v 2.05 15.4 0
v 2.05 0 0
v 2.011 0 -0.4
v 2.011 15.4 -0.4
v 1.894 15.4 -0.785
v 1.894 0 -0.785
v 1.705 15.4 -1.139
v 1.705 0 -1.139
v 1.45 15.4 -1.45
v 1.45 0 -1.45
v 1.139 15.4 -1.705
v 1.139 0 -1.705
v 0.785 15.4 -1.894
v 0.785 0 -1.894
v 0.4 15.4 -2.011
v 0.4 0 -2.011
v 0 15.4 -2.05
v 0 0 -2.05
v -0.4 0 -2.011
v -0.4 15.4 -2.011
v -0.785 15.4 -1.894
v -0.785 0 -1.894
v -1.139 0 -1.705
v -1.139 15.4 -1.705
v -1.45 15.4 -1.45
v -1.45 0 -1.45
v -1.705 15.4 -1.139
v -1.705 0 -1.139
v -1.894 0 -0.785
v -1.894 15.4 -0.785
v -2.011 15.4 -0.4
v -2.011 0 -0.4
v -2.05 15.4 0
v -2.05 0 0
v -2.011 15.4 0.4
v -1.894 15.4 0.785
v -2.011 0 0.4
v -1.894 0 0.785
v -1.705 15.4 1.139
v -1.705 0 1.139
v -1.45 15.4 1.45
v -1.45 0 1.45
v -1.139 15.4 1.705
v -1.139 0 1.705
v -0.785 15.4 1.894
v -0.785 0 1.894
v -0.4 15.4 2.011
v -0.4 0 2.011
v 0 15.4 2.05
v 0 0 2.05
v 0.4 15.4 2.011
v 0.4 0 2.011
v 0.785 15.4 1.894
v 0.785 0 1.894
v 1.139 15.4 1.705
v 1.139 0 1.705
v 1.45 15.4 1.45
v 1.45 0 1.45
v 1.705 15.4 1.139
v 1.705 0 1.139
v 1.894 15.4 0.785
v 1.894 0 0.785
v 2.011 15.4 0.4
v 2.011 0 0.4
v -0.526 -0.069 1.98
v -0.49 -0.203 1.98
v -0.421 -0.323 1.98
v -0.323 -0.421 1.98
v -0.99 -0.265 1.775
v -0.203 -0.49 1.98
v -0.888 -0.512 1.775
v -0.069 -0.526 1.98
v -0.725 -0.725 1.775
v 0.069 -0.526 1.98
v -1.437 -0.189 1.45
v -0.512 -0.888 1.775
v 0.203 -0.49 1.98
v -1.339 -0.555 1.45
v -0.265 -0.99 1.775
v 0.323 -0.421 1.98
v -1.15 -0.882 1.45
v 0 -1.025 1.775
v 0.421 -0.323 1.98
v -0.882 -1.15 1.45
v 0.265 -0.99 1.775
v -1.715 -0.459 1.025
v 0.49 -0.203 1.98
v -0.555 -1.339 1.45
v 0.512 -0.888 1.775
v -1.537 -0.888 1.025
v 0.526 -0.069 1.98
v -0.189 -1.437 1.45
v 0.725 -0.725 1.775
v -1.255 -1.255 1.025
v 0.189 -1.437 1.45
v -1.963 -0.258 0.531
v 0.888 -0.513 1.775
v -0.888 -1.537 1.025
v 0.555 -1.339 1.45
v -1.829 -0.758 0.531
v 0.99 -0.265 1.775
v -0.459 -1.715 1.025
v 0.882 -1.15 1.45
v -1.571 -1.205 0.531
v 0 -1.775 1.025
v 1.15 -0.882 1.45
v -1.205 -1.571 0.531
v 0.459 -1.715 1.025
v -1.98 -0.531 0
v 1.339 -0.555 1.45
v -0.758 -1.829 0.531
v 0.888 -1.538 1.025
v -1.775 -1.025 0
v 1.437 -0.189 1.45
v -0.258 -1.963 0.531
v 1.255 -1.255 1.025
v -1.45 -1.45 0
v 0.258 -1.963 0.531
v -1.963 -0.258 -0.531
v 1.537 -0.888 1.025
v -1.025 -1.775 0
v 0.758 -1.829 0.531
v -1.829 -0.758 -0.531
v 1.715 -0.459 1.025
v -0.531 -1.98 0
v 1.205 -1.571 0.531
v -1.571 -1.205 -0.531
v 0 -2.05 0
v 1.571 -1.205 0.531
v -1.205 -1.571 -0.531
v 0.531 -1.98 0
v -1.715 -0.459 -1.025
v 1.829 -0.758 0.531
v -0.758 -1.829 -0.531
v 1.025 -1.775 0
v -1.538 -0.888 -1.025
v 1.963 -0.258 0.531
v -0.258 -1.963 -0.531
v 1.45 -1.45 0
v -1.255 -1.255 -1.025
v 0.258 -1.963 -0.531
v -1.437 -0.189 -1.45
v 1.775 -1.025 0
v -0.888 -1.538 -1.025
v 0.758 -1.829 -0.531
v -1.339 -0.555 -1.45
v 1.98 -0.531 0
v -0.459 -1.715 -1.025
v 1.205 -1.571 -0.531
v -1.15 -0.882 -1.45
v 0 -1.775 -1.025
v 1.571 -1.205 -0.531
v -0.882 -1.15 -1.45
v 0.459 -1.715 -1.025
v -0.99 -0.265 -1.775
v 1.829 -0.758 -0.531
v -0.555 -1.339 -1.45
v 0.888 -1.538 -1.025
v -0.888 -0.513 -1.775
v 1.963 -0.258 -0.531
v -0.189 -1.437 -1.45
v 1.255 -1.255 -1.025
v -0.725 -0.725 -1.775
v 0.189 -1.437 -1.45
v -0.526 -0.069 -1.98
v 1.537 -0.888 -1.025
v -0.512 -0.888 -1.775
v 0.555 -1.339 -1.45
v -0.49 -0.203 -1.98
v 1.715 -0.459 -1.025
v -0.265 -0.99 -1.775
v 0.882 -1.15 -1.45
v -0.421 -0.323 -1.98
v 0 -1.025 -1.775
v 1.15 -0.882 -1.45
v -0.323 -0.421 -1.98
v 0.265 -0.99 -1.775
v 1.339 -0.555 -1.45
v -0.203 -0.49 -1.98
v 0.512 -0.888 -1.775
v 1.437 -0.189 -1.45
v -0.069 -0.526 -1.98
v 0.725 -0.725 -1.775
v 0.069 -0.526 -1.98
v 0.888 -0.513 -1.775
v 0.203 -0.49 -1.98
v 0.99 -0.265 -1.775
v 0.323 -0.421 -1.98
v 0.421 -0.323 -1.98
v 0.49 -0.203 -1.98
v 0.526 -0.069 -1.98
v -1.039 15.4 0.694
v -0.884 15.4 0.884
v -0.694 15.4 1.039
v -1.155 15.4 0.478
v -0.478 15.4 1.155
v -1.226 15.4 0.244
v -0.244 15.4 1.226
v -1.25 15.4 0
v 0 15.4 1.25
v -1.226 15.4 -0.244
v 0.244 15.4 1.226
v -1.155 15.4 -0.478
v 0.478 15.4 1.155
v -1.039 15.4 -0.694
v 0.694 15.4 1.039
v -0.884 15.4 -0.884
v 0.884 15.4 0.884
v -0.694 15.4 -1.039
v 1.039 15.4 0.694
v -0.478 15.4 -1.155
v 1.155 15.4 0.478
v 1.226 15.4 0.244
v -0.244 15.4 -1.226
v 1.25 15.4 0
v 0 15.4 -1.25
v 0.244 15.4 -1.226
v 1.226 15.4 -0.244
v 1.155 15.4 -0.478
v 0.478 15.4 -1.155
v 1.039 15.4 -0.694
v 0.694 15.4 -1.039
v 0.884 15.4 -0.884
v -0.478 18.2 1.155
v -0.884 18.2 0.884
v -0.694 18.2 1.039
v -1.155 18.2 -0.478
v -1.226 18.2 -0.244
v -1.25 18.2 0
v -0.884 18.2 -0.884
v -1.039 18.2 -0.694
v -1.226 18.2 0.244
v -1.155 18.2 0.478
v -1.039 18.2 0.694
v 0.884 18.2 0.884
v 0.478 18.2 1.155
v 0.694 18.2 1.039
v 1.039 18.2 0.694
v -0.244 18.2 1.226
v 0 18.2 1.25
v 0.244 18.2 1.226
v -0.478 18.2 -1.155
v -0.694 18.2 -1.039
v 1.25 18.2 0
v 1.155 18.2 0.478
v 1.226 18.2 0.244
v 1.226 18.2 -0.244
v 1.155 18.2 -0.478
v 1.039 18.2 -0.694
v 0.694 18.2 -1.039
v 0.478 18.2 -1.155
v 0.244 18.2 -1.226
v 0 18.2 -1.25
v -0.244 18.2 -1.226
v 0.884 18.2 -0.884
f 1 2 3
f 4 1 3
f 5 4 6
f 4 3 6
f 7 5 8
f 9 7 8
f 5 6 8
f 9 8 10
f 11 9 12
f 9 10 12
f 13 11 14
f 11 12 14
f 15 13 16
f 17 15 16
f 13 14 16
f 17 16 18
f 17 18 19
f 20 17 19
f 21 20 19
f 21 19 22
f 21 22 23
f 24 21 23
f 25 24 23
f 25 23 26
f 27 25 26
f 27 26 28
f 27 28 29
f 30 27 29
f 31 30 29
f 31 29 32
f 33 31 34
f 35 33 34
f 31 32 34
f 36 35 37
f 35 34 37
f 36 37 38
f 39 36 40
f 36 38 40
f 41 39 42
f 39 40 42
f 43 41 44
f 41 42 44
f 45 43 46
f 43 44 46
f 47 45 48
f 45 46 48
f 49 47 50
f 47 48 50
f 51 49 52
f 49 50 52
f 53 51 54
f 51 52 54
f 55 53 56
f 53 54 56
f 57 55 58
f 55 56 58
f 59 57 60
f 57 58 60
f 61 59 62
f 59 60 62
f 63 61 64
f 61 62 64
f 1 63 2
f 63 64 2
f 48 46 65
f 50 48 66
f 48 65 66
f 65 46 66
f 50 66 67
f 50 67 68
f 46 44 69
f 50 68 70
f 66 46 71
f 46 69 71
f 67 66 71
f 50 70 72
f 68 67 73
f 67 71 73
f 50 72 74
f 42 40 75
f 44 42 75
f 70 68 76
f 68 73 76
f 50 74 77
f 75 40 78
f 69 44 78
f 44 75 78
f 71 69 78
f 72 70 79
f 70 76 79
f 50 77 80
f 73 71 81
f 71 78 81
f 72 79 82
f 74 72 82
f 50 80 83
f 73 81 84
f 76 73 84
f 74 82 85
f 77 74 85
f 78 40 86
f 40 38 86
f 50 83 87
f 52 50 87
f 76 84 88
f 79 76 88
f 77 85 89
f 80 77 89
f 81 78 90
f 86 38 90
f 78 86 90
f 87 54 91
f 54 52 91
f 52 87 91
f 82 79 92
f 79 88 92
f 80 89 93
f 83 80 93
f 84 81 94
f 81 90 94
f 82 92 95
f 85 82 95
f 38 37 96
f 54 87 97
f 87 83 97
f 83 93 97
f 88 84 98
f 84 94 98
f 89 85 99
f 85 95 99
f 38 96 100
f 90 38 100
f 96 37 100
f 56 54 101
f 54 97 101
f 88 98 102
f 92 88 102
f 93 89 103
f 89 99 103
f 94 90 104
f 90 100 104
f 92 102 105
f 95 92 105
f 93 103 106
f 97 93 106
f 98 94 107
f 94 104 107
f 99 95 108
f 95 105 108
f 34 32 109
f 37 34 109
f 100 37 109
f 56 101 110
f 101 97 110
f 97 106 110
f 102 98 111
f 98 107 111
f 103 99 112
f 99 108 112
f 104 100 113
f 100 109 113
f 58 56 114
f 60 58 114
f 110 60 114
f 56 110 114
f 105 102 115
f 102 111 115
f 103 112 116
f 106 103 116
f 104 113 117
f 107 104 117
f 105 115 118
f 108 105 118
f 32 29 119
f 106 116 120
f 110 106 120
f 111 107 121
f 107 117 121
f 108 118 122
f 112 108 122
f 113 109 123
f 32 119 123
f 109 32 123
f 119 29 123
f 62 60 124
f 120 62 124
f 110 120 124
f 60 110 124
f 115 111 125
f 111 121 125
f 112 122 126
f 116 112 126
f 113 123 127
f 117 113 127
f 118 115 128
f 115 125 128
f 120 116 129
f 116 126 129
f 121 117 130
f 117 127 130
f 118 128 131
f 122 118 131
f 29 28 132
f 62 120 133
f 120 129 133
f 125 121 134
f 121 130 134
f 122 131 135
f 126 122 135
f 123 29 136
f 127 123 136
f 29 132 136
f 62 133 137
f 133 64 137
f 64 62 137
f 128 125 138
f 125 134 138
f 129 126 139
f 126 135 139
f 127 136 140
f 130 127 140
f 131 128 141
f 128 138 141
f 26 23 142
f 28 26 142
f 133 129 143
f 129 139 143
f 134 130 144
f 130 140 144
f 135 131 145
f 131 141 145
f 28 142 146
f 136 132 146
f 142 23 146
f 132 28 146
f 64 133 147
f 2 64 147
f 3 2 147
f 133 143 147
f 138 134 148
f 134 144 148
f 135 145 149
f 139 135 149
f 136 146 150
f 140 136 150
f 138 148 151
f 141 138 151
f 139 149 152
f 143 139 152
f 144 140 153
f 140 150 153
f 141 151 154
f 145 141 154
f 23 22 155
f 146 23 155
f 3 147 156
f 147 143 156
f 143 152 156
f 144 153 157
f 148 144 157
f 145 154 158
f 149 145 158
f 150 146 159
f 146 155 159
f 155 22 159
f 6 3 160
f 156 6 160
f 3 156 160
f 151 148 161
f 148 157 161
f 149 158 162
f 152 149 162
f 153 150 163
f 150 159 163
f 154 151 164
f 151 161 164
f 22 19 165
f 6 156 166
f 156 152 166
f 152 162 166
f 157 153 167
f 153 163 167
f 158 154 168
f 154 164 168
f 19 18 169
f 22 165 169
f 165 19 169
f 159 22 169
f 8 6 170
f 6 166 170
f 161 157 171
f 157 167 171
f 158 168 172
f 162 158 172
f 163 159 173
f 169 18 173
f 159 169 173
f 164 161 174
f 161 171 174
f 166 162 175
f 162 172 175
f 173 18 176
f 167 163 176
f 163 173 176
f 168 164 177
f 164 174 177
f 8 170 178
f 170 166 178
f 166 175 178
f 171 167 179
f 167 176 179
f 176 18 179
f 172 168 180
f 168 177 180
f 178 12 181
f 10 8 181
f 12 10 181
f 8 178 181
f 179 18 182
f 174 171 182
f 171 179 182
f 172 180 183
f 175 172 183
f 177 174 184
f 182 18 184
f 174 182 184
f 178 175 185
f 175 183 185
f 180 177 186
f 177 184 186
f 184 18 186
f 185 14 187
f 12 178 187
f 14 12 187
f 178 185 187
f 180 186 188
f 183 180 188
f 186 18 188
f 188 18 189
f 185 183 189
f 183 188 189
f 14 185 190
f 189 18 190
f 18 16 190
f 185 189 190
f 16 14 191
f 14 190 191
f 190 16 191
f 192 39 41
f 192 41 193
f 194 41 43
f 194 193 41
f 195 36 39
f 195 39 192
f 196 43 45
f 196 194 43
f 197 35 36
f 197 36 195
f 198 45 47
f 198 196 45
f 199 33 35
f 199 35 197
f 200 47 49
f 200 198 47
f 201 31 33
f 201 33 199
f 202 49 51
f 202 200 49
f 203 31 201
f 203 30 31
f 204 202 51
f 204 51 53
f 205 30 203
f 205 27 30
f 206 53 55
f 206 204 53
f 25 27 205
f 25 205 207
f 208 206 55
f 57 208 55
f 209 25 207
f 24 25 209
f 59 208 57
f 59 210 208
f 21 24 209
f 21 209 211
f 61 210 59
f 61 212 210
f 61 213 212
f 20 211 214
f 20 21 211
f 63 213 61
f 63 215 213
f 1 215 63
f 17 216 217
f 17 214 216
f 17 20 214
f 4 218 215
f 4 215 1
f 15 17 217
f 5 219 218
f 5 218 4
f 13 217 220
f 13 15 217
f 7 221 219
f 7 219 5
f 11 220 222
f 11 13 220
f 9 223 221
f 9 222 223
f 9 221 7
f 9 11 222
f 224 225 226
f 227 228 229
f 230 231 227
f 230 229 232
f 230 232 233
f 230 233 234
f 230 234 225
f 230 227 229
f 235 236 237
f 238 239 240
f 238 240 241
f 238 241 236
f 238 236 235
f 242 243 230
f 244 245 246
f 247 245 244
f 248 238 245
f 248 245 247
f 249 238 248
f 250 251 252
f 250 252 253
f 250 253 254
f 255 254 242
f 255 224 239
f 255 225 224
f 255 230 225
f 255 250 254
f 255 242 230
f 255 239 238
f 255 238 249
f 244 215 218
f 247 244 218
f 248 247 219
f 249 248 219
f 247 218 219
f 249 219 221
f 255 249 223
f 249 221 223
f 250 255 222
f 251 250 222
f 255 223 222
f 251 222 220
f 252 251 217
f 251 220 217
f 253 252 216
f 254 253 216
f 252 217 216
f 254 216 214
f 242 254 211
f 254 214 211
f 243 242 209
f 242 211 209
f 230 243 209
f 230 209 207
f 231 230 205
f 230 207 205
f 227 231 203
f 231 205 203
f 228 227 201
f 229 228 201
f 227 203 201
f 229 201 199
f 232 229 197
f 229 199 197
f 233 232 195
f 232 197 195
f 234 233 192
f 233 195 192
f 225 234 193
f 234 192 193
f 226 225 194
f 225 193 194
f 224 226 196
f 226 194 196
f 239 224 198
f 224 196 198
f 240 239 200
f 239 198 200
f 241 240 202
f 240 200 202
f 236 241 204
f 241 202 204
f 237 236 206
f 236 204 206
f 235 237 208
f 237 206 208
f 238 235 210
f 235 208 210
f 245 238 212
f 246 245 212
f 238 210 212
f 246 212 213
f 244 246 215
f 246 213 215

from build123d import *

# Parameters (mm, degrees)
CROQUIS1_R              = 2.05
SALIENTE_EXTRUIR1_DEPTH = 15.4
CROQUIS2_R              = 1.25
SALIENTE_EXTRUIR2_DEPTH = 2.8


with BuildPart() as part:
    # Croquis1 → Saliente-Extruir1 (new body)
    with BuildSketch(Plane(origin=(0, 0, 0), x_dir=(1, 0, 0), z_dir=(0, 1, 0))):
        Circle(CROQUIS1_R)
    extrude(amount=SALIENTE_EXTRUIR1_DEPTH)

    # Croquis2 → Saliente-Extruir2 (add)
    with BuildSketch(Plane(origin=(0, 15.4, 0), x_dir=(1, 0, 0), z_dir=(0, 1, 0))):
        Circle(CROQUIS2_R)
    extrude(amount=SALIENTE_EXTRUIR2_DEPTH)

    # Croquis4 → Revolución2 (revolve)
    with BuildSketch(Plane.XZ):
        with BuildLine():
            Line((0, -2.05), (0, 2.05))
            ThreePointArc((0, 2.05), (2.05, 0), (0, -2.05))
        make_face()
    revolve(axis=Axis((0, 0, -2.05), (0, 0, 1)))


solid = part.part
